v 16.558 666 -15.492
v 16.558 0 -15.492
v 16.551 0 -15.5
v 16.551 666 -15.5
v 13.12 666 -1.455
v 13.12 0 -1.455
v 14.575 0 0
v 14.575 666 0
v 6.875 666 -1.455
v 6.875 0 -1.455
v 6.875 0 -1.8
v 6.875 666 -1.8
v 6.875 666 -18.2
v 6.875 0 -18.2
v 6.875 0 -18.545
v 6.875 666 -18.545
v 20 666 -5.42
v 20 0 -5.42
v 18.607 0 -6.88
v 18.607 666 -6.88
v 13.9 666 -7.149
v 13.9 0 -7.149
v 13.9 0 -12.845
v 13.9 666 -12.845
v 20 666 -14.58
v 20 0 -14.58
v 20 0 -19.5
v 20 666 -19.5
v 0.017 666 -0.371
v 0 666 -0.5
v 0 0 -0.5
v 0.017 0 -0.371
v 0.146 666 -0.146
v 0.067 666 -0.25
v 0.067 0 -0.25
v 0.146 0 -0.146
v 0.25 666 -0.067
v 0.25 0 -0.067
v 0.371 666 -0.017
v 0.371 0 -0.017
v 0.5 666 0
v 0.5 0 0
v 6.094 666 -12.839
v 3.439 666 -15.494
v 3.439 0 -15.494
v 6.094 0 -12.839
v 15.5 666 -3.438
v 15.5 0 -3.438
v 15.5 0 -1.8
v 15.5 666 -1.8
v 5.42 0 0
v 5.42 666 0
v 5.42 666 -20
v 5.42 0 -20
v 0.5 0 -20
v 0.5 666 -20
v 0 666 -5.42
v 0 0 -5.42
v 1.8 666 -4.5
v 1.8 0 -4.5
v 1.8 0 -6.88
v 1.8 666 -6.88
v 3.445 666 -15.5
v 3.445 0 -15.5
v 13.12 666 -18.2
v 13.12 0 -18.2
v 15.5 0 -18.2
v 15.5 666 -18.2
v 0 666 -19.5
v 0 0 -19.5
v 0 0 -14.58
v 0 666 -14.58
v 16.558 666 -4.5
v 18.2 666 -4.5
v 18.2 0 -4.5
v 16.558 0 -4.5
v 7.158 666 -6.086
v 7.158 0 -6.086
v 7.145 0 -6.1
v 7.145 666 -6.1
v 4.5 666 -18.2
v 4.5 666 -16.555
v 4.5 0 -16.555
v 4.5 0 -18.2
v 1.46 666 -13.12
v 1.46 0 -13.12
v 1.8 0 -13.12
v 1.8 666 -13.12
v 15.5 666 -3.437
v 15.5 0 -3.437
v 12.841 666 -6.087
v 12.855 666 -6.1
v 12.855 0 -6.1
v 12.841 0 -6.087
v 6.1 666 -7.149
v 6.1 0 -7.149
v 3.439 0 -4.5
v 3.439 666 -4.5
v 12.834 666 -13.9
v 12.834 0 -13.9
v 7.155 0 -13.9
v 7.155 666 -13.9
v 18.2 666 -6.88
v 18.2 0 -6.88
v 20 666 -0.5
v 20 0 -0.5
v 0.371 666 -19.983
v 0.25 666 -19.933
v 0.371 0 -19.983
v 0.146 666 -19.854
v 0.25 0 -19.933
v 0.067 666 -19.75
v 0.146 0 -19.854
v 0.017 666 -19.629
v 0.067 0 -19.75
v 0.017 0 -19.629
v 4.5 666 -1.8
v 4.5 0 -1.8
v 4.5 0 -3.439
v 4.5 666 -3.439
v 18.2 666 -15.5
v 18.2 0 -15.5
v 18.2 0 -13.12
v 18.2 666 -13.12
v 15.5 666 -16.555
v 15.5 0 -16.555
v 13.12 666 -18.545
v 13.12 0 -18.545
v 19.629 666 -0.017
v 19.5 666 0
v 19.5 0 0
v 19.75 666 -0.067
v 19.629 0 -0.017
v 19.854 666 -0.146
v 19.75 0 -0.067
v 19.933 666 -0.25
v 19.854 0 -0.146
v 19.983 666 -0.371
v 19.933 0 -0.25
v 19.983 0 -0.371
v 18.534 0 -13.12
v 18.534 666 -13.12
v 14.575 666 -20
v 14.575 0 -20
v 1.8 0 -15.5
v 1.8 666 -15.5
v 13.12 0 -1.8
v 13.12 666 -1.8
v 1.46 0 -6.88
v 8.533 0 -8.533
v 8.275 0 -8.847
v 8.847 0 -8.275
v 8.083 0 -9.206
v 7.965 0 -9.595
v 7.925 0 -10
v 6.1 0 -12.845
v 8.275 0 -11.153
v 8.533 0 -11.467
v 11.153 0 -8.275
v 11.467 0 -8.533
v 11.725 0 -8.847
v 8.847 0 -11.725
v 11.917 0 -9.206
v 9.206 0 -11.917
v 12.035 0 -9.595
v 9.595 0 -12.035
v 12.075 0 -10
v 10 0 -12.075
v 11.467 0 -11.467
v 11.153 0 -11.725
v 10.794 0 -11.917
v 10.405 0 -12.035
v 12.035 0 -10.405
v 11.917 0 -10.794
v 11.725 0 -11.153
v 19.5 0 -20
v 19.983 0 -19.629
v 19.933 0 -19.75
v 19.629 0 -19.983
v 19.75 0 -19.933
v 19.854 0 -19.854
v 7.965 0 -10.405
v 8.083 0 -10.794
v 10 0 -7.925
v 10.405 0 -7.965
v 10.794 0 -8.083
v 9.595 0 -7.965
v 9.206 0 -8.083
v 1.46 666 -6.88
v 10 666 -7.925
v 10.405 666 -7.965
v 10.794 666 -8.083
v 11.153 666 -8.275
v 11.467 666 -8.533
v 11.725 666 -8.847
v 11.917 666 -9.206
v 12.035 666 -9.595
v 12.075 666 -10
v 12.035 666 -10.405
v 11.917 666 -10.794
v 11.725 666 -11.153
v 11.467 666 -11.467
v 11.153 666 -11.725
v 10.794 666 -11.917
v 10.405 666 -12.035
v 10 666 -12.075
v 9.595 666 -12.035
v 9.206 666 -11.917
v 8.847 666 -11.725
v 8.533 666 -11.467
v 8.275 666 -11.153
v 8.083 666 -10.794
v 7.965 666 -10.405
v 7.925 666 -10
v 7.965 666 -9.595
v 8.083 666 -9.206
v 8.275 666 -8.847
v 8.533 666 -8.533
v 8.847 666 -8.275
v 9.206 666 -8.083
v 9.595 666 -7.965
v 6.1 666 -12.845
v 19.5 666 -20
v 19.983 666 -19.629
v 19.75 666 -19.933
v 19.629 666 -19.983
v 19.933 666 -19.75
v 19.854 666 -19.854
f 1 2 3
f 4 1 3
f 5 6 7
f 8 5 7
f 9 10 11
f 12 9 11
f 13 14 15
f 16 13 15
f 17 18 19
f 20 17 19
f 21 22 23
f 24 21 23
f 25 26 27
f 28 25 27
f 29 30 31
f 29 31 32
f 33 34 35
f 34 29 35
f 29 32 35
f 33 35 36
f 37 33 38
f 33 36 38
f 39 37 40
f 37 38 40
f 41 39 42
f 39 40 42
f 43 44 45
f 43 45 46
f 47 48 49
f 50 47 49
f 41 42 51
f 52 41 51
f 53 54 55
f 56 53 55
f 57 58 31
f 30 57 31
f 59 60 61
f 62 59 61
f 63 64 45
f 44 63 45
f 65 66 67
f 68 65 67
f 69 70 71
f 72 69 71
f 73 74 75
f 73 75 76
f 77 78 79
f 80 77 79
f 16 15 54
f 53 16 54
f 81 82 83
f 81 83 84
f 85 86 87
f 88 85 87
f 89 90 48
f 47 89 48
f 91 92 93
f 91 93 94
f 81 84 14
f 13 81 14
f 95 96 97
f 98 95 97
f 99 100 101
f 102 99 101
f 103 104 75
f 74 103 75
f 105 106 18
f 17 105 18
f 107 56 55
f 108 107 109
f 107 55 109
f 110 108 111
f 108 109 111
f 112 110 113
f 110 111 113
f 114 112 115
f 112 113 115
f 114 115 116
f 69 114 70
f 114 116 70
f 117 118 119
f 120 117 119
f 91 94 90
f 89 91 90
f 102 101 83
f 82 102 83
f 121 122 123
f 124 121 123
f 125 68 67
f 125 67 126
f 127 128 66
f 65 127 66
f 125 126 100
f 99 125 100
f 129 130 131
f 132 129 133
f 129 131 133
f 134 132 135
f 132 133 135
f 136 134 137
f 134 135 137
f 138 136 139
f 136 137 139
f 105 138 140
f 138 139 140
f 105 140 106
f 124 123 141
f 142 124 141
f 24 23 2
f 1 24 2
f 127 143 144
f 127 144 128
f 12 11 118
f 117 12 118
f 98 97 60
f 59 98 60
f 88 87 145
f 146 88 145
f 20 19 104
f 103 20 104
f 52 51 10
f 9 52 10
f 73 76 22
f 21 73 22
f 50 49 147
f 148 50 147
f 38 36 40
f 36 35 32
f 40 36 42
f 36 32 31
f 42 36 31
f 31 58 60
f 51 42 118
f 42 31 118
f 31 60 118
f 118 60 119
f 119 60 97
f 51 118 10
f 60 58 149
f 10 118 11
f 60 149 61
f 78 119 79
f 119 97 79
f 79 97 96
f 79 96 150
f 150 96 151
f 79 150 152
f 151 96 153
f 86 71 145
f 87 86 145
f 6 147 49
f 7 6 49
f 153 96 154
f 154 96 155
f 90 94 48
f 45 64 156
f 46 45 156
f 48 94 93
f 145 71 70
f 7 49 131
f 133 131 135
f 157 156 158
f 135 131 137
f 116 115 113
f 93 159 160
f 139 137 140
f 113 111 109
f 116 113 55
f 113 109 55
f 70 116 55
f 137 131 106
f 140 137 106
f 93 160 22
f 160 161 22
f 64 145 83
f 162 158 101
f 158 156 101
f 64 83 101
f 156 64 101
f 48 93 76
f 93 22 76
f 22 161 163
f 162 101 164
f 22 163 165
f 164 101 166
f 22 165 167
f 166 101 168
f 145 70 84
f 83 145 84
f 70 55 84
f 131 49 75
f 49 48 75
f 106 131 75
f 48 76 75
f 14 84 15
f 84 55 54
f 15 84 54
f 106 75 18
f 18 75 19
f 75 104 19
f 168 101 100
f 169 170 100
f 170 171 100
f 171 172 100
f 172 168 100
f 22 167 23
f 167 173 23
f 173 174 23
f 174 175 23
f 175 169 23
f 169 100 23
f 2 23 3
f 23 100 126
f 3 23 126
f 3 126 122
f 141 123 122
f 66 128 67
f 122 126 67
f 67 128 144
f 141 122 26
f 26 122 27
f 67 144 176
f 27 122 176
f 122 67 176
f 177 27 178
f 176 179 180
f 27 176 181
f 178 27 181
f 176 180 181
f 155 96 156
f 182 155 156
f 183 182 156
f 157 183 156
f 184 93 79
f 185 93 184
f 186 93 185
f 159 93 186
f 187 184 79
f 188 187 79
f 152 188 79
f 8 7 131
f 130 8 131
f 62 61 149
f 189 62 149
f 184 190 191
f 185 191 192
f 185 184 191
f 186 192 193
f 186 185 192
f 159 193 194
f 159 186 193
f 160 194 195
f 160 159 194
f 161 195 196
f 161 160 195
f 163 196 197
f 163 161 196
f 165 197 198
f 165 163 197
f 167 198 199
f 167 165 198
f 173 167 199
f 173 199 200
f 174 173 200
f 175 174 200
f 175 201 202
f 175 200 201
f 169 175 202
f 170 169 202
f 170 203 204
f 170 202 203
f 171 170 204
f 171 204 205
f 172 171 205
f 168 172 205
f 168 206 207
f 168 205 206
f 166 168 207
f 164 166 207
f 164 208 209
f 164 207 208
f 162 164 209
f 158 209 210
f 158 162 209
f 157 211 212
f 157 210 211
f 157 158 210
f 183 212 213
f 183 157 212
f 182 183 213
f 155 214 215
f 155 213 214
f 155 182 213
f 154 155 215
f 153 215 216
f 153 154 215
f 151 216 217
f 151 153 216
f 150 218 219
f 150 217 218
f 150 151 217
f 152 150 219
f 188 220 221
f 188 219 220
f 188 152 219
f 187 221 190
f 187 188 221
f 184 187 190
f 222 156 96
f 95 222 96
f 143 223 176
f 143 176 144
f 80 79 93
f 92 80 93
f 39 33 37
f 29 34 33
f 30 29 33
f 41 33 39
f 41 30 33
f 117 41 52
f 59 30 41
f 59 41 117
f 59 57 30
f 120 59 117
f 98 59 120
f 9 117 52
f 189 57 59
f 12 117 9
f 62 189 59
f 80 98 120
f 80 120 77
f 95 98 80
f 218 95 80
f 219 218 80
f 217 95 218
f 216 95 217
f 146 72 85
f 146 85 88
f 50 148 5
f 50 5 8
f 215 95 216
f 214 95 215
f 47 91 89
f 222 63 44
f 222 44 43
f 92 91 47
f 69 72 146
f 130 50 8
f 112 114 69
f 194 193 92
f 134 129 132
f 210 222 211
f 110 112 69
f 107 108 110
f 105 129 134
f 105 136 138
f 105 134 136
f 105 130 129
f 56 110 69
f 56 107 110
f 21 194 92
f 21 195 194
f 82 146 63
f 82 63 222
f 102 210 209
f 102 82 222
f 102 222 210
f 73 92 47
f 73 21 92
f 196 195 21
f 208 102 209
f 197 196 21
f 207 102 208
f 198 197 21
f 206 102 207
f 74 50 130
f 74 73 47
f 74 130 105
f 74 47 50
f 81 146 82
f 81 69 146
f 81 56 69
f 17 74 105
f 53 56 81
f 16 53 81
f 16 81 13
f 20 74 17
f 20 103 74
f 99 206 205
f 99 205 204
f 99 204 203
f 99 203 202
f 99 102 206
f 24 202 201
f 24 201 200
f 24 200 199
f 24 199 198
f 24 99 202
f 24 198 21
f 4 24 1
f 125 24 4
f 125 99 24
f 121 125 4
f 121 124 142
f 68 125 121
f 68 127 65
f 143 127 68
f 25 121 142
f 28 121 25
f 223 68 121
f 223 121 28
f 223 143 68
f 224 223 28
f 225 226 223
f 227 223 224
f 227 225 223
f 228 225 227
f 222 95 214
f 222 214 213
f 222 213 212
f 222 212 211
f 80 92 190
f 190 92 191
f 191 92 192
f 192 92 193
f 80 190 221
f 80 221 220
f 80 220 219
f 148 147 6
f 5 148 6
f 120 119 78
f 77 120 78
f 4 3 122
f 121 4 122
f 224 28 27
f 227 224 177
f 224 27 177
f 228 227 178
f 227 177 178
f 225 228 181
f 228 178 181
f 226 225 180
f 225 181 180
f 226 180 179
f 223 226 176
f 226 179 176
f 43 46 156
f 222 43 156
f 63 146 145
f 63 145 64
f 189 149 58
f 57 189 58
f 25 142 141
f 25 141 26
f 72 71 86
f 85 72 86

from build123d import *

# Parameters (mm, degrees)
SKETCH1_R             = 2.074585303
BOSS_EXTRUDE2_DEPTH   = 1000
CROQUIS1_W            = 21.960617296
CROQUIS1_H            = 22.681220878
CORTAR_EXTRUIR1_DEPTH = 334


with BuildPart() as part:
    # Sketch1 → Boss-Extrude2 (new body)
    with BuildSketch(Plane(origin=(0, 0, 0), x_dir=(1, 0, 0), z_dir=(0, 1, 0))):
        with BuildLine():
            Line((6.1, 12.845), (6.1, 7.149086807))
            Line((6.1, 7.149086807), (3.439339828, 4.5))
            Line((3.439339828, 4.5), (1.8, 4.5))
            Line((1.8, 4.5), (1.8, 6.88))
            Line((1.8, 6.88), (1.46, 6.88))
            Line((1.46, 6.88), (0, 5.42))
            Line((0, 5.42), (0, 0.5))
            ThreePointArc((0, 0.5), (0.146446609, 0.146446609), (0.5, 0))
            Line((0.5, 0), (5.42, 0))
            Line((5.42, 0), (6.875, 1.455))
            Line((6.875, 1.455), (6.875, 1.8))
            Line((6.875, 1.8), (4.5, 1.8))
            Line((4.5, 1.8), (4.5, 3.4393348))
            Line((4.5, 3.4393348), (7.158345795, 6.086117297))
            Line((7.158345795, 6.086117297), (7.144523479, 6.1))
            Line((7.144523479, 6.1), (12.854625295, 6.1))
            Line((12.854625295, 6.1), (12.841221344, 6.086548451))
            Line((12.841221344, 6.086548451), (15.499715, 3.437461644))
            Line((15.499715, 3.437461644), (15.5, 3.437747657))
            Line((15.5, 3.437747657), (15.5, 1.8))
            Line((15.5, 1.8), (13.12, 1.8))
            Line((13.12, 1.8), (13.12, 1.455))
            Line((13.12, 1.455), (14.575, 0))
            Line((14.575, 0), (19.5, 0))
            ThreePointArc((19.5, 0), (19.853553391, 0.146446609), (20, 0.5))
            Line((20, 0.5), (20, 5.42))
            Line((20, 5.42), (18.606904708, 6.88))
            Line((18.606904708, 6.88), (18.2, 6.88))
            Line((18.2, 6.88), (18.2, 4.5))
            Line((18.2, 4.5), (16.558493656, 4.5))
            Line((16.558493656, 4.5), (13.9, 7.149086807))
            Line((13.9, 7.149086807), (13.9, 12.844511469))
            Line((13.9, 12.844511469), (16.558493656, 15.492177728))
            Line((16.558493656, 15.492177728), (16.550703242, 15.5))
            Line((16.550703242, 15.5), (18.2, 15.5))
            Line((18.2, 15.5), (18.2, 13.12))
            Line((18.2, 13.12), (18.534428266, 13.12))
            Line((18.534428266, 13.12), (20, 14.58))
            Line((20, 14.58), (20, 19.5))
            ThreePointArc((20, 19.5), (19.853553391, 19.853553391), (19.5, 20))
            Line((19.5, 20), (14.575, 20))
            Line((14.575, 20), (13.12, 18.545))
            Line((13.12, 18.545), (13.12, 18.2))
            Line((13.12, 18.2), (15.5, 18.2))
            Line((15.5, 18.2), (15.5, 16.555))
            Line((15.5, 16.555), (12.834142613, 13.9))
            Line((12.834142613, 13.9), (7.155, 13.9))
            Line((7.155, 13.9), (4.5, 16.555))
            Line((4.5, 16.555), (4.5, 18.2))
            Line((4.5, 18.2), (6.875, 18.2))
            Line((6.875, 18.2), (6.875, 18.545))
            Line((6.875, 18.545), (5.42, 20))
            Line((5.42, 20), (0.5, 20))
            ThreePointArc((0.5, 20), (0.146446609, 19.853553391), (0, 19.5))
            Line((0, 19.5), (0, 14.58))
            Line((0, 14.58), (1.46, 13.12))
            Line((1.46, 13.12), (1.8, 13.12))
            Line((1.8, 13.12), (1.8, 15.5))
            Line((1.8, 15.5), (3.445, 15.5))
            Line((3.445, 15.5), (3.439339828, 15.494339828))
            Line((3.439339828, 15.494339828), (6.094339828, 12.839339828))
            Line((6.094339828, 12.839339828), (6.1, 12.845))
        make_face()
        with Locations((10, 10)):
            Circle(SKETCH1_R, mode=Mode.SUBTRACT)
    extrude(amount=BOSS_EXTRUDE2_DEPTH)

    # Croquis1 → Cortar-Extruir1 (cut)
    with BuildSketch(Plane(origin=(0, 1000, 0), x_dir=(1, 0, 0), z_dir=(0, 1, 0))):
        with Locations((10, 10)):
            Rectangle(CROQUIS1_W, CROQUIS1_H)
    extrude(amount=-CORTAR_EXTRUIR1_DEPTH, mode=Mode.SUBTRACT)


solid = part.part
